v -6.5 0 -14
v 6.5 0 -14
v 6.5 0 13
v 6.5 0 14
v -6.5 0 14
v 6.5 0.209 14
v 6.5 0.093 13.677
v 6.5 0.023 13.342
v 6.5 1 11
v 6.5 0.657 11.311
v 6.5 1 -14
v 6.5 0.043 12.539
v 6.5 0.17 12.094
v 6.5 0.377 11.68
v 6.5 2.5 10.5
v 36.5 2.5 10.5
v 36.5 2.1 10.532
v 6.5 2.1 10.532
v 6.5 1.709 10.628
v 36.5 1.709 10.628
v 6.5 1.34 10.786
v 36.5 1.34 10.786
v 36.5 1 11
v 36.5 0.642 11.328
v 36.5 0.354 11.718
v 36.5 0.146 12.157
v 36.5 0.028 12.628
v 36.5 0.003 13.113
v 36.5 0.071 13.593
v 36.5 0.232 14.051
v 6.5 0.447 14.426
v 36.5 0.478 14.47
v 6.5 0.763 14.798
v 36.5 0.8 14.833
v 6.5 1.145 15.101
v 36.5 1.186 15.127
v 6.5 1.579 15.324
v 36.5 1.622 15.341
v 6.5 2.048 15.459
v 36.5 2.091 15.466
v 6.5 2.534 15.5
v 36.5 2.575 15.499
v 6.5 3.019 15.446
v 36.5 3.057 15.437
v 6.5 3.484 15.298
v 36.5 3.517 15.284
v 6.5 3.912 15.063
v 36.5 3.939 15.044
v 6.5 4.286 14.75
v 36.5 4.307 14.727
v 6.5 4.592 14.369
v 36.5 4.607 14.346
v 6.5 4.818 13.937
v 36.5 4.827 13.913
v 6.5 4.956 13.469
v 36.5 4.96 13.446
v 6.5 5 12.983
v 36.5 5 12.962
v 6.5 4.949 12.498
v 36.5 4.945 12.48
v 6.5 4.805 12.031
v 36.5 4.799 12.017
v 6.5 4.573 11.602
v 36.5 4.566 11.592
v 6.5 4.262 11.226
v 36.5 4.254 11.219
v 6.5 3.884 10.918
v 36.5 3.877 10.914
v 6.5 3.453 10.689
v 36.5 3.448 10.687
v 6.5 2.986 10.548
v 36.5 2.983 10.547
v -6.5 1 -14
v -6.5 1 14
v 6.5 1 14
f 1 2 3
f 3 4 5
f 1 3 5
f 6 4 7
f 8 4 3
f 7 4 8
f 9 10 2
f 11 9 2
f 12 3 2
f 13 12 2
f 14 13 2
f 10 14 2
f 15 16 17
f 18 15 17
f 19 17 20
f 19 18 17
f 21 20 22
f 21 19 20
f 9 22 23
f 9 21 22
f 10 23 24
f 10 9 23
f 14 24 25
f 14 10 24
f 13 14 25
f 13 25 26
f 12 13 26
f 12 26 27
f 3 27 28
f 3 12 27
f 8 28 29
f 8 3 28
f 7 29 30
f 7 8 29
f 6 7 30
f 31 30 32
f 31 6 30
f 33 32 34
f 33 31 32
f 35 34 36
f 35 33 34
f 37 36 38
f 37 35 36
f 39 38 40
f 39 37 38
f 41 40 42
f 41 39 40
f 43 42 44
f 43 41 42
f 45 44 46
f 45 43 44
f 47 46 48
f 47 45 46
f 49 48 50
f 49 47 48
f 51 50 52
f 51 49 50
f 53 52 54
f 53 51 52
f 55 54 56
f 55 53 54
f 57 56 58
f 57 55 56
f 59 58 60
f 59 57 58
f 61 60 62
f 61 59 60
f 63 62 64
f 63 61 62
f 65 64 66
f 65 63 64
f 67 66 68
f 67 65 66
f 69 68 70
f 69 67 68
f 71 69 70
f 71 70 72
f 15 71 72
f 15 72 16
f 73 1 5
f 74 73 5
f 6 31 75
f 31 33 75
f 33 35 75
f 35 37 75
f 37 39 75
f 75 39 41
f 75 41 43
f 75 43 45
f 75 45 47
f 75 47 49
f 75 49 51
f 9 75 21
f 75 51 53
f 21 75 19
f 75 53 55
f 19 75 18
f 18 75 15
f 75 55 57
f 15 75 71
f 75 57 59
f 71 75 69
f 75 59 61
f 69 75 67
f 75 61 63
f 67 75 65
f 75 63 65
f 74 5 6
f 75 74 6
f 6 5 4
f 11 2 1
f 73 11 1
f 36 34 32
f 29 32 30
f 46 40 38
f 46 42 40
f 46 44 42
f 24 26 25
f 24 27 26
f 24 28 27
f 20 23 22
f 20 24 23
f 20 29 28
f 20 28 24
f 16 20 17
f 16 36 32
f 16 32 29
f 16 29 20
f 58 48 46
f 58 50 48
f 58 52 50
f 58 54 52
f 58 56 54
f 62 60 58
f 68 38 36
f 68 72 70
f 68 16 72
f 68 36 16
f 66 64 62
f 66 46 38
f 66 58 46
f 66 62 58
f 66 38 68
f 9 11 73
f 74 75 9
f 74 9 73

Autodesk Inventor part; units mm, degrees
ref_plane "YZ Plane" through (0, 0, 0) normal (1, 0, 0) x (0, 1, 0)
ref_plane "XZ Plane" through (0, 0, 0) normal (0, 1, 0) x (-1, 0, 0)
ref_plane "XY Plane" through (0, 0, 0) normal (0, 0, 1) x (1, 0, 0)
sketch "Sketch1" plane through (0, 0, 0) normal (0, 1, 0) x (-1, 0, 0)
  line L0 (6.5, 14) -> (-6.5, 14)
  line L1 (-6.5, 14) -> (-6.5, -14)
  line L2 (-6.5, -14) -> (6.5, -14)
  line L3 (6.5, -14) -> (6.5, 14)
  line L4 (6.5, 14) -> (-6.5, -14) construction
  line L5 (-6.5, 14) -> (6.5, -14) construction
  point P0 (0, 0)
  dimension "d0" = 13
  dimension "d1" = 28
extrude "Extrusion1" add sketch "Sketch1" along normal blind 1
sketch "Sketch2" plane through (6.5, 0, 14) normal (1, 0, 0) x (0, 0, -1)
  circle A0 centre (1, 1.25) radius 0.25
  circle A1 centre (1, 2.5) radius 2.5
  line L0 (0, 1) -> (28, 1) projected
  line L1 (0, 0) -> (28, 0) projected
  point P0 (14, 0)
  dimension "d4" = 0.5
  dimension "d5" = 5
  dimension "d6" = 1
extrude "Extrusion2" add sketch "Sketch2" along normal blind 30 contours A0 | A1
properties part number "Telemetrie"
